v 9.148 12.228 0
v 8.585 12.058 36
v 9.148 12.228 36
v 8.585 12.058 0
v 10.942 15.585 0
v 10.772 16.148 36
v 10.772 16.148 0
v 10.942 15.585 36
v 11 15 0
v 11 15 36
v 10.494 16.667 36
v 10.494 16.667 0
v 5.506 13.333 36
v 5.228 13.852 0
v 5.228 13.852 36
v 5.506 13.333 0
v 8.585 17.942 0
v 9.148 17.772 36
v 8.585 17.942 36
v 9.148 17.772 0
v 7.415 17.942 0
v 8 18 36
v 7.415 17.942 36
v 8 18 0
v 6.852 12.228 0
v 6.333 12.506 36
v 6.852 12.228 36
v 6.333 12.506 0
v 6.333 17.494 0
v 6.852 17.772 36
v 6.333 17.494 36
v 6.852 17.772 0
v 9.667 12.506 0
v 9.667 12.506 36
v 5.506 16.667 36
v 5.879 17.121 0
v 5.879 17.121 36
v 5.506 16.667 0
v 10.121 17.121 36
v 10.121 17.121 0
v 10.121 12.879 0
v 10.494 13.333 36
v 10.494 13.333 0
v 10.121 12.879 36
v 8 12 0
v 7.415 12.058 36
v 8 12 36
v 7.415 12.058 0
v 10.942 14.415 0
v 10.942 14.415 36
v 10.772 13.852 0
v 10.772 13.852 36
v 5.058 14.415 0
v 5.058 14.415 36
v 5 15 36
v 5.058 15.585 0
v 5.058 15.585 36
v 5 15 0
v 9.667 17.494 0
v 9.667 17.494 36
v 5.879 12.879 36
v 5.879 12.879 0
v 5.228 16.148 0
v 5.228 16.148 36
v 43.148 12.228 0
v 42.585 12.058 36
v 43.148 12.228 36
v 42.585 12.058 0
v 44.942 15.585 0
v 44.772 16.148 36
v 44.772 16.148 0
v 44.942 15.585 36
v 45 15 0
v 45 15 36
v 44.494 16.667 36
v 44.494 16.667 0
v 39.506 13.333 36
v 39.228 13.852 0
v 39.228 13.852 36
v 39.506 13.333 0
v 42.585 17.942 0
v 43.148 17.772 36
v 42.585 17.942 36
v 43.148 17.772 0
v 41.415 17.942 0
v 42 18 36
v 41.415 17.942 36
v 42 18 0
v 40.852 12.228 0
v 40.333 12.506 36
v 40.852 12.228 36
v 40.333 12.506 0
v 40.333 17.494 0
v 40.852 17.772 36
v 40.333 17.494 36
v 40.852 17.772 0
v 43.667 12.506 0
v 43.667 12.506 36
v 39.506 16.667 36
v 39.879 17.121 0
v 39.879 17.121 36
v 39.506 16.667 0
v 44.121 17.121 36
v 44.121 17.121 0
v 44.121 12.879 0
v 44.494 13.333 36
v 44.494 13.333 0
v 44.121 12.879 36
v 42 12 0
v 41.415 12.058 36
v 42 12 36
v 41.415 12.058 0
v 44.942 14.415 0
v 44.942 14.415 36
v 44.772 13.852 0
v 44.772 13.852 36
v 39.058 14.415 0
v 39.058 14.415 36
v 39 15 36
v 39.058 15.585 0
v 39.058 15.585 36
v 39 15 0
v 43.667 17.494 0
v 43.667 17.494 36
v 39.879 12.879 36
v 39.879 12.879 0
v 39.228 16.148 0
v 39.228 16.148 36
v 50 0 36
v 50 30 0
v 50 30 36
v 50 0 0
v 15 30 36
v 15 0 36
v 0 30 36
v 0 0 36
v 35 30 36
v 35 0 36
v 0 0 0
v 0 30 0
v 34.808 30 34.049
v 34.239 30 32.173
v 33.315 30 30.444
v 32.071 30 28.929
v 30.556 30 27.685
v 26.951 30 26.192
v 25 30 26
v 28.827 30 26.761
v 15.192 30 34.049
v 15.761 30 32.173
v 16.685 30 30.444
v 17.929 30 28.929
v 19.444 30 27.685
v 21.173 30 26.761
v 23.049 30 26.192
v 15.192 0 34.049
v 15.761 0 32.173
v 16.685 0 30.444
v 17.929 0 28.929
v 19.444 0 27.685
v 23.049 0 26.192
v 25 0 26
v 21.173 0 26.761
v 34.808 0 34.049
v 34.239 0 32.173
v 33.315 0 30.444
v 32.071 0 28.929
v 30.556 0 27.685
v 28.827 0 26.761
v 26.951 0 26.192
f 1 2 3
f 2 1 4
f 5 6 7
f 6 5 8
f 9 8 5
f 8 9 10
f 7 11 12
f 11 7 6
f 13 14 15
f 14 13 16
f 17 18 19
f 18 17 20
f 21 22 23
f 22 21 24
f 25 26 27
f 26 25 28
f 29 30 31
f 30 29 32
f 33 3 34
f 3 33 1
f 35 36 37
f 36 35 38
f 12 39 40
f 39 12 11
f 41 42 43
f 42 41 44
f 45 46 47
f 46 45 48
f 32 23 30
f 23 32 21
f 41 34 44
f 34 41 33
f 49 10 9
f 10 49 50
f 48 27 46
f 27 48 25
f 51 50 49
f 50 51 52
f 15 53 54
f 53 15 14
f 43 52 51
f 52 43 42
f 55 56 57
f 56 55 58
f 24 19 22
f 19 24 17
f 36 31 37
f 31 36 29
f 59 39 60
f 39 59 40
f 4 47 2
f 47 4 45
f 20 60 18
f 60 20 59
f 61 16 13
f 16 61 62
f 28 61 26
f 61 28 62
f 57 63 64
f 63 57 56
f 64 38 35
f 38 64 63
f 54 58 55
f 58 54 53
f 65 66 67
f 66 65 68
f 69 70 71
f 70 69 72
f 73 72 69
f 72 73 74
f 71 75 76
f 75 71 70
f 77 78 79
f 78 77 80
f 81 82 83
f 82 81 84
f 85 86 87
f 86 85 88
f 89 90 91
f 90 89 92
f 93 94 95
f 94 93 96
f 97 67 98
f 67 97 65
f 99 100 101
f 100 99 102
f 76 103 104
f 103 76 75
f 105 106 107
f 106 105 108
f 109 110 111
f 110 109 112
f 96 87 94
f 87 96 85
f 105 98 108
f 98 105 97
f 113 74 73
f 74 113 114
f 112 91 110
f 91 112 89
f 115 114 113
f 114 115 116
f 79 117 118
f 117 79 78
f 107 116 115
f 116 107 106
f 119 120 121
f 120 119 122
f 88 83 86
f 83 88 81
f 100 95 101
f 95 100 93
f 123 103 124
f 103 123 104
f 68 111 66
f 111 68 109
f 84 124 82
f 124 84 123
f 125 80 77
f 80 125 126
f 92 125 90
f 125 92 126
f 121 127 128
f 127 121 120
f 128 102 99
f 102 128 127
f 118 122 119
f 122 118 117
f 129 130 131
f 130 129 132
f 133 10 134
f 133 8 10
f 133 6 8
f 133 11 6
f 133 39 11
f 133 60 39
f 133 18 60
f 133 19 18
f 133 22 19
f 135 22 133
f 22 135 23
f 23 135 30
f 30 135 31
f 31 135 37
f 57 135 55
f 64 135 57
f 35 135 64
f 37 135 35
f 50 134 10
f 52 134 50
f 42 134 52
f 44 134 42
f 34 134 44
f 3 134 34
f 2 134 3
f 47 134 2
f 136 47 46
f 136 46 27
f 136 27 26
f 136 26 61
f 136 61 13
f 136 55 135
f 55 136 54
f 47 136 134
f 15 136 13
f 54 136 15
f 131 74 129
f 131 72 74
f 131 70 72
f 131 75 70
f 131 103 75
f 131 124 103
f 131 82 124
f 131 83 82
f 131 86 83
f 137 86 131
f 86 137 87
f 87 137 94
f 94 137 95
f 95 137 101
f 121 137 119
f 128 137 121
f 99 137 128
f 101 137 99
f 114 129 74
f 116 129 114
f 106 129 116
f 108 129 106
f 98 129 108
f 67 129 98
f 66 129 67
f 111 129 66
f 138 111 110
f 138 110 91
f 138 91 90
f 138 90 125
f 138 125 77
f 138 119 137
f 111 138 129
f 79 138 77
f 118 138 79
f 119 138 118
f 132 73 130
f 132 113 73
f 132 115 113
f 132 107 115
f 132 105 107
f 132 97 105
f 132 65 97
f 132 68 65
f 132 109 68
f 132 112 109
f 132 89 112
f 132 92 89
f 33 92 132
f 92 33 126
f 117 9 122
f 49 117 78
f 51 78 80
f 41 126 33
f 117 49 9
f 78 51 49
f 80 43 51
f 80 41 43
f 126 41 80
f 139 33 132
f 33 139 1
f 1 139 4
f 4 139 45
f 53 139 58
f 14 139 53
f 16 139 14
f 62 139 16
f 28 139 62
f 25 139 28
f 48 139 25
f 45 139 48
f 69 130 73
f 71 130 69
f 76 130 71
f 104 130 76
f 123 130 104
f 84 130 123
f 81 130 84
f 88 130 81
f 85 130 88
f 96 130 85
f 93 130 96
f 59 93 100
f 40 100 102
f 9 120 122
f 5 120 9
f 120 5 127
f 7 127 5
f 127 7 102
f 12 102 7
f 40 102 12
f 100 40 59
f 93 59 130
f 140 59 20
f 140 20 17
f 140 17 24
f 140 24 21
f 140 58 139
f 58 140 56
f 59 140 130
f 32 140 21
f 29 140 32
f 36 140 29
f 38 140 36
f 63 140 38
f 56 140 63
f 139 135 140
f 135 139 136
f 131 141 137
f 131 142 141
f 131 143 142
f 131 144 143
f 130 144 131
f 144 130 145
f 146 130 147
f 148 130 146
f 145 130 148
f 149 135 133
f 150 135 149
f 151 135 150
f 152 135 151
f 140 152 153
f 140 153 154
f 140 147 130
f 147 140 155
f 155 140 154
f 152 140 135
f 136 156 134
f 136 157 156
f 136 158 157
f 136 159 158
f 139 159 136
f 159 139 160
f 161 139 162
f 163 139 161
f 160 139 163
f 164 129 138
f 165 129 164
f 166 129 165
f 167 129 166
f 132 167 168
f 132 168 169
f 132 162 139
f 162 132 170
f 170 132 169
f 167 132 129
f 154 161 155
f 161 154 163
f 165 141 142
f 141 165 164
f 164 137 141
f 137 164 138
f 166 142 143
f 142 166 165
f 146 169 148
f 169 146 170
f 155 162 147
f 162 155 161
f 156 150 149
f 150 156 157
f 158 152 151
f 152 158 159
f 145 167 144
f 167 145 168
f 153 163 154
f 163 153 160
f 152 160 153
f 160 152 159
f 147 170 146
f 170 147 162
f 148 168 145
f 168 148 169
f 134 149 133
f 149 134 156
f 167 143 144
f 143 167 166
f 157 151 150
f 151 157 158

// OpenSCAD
$fn = 32;

// ----------------------------------------------------------------------
// Saddle clamp: plain shaft clamp
// ----------------------------------------------------------------------

// --- parameters (mm) ---
blk_l = 50;               // block length, X
blk_w = 30;               // block width, Y
blk_h = 36;               // block height
clamp_r = 10;             // shaft groove radius
hole_r = 3;               // bolt hole radius
hole_m = 8;               // bolt hole margin from the ends

saw_depth = clamp_r + 3;  // saw kerf depth

difference() {
  cube([blk_l, blk_w, blk_h]);
  translate([blk_l / 2, -1, blk_h])
    rotate([-90, 0, 0])
      cylinder(h = blk_w + 2, r = clamp_r);
  for (sx = [0, 1])
    translate([sx ? blk_l - hole_m : hole_m, blk_w / 2, -1])
      cylinder(r = hole_r, h = blk_h + 2);
}
